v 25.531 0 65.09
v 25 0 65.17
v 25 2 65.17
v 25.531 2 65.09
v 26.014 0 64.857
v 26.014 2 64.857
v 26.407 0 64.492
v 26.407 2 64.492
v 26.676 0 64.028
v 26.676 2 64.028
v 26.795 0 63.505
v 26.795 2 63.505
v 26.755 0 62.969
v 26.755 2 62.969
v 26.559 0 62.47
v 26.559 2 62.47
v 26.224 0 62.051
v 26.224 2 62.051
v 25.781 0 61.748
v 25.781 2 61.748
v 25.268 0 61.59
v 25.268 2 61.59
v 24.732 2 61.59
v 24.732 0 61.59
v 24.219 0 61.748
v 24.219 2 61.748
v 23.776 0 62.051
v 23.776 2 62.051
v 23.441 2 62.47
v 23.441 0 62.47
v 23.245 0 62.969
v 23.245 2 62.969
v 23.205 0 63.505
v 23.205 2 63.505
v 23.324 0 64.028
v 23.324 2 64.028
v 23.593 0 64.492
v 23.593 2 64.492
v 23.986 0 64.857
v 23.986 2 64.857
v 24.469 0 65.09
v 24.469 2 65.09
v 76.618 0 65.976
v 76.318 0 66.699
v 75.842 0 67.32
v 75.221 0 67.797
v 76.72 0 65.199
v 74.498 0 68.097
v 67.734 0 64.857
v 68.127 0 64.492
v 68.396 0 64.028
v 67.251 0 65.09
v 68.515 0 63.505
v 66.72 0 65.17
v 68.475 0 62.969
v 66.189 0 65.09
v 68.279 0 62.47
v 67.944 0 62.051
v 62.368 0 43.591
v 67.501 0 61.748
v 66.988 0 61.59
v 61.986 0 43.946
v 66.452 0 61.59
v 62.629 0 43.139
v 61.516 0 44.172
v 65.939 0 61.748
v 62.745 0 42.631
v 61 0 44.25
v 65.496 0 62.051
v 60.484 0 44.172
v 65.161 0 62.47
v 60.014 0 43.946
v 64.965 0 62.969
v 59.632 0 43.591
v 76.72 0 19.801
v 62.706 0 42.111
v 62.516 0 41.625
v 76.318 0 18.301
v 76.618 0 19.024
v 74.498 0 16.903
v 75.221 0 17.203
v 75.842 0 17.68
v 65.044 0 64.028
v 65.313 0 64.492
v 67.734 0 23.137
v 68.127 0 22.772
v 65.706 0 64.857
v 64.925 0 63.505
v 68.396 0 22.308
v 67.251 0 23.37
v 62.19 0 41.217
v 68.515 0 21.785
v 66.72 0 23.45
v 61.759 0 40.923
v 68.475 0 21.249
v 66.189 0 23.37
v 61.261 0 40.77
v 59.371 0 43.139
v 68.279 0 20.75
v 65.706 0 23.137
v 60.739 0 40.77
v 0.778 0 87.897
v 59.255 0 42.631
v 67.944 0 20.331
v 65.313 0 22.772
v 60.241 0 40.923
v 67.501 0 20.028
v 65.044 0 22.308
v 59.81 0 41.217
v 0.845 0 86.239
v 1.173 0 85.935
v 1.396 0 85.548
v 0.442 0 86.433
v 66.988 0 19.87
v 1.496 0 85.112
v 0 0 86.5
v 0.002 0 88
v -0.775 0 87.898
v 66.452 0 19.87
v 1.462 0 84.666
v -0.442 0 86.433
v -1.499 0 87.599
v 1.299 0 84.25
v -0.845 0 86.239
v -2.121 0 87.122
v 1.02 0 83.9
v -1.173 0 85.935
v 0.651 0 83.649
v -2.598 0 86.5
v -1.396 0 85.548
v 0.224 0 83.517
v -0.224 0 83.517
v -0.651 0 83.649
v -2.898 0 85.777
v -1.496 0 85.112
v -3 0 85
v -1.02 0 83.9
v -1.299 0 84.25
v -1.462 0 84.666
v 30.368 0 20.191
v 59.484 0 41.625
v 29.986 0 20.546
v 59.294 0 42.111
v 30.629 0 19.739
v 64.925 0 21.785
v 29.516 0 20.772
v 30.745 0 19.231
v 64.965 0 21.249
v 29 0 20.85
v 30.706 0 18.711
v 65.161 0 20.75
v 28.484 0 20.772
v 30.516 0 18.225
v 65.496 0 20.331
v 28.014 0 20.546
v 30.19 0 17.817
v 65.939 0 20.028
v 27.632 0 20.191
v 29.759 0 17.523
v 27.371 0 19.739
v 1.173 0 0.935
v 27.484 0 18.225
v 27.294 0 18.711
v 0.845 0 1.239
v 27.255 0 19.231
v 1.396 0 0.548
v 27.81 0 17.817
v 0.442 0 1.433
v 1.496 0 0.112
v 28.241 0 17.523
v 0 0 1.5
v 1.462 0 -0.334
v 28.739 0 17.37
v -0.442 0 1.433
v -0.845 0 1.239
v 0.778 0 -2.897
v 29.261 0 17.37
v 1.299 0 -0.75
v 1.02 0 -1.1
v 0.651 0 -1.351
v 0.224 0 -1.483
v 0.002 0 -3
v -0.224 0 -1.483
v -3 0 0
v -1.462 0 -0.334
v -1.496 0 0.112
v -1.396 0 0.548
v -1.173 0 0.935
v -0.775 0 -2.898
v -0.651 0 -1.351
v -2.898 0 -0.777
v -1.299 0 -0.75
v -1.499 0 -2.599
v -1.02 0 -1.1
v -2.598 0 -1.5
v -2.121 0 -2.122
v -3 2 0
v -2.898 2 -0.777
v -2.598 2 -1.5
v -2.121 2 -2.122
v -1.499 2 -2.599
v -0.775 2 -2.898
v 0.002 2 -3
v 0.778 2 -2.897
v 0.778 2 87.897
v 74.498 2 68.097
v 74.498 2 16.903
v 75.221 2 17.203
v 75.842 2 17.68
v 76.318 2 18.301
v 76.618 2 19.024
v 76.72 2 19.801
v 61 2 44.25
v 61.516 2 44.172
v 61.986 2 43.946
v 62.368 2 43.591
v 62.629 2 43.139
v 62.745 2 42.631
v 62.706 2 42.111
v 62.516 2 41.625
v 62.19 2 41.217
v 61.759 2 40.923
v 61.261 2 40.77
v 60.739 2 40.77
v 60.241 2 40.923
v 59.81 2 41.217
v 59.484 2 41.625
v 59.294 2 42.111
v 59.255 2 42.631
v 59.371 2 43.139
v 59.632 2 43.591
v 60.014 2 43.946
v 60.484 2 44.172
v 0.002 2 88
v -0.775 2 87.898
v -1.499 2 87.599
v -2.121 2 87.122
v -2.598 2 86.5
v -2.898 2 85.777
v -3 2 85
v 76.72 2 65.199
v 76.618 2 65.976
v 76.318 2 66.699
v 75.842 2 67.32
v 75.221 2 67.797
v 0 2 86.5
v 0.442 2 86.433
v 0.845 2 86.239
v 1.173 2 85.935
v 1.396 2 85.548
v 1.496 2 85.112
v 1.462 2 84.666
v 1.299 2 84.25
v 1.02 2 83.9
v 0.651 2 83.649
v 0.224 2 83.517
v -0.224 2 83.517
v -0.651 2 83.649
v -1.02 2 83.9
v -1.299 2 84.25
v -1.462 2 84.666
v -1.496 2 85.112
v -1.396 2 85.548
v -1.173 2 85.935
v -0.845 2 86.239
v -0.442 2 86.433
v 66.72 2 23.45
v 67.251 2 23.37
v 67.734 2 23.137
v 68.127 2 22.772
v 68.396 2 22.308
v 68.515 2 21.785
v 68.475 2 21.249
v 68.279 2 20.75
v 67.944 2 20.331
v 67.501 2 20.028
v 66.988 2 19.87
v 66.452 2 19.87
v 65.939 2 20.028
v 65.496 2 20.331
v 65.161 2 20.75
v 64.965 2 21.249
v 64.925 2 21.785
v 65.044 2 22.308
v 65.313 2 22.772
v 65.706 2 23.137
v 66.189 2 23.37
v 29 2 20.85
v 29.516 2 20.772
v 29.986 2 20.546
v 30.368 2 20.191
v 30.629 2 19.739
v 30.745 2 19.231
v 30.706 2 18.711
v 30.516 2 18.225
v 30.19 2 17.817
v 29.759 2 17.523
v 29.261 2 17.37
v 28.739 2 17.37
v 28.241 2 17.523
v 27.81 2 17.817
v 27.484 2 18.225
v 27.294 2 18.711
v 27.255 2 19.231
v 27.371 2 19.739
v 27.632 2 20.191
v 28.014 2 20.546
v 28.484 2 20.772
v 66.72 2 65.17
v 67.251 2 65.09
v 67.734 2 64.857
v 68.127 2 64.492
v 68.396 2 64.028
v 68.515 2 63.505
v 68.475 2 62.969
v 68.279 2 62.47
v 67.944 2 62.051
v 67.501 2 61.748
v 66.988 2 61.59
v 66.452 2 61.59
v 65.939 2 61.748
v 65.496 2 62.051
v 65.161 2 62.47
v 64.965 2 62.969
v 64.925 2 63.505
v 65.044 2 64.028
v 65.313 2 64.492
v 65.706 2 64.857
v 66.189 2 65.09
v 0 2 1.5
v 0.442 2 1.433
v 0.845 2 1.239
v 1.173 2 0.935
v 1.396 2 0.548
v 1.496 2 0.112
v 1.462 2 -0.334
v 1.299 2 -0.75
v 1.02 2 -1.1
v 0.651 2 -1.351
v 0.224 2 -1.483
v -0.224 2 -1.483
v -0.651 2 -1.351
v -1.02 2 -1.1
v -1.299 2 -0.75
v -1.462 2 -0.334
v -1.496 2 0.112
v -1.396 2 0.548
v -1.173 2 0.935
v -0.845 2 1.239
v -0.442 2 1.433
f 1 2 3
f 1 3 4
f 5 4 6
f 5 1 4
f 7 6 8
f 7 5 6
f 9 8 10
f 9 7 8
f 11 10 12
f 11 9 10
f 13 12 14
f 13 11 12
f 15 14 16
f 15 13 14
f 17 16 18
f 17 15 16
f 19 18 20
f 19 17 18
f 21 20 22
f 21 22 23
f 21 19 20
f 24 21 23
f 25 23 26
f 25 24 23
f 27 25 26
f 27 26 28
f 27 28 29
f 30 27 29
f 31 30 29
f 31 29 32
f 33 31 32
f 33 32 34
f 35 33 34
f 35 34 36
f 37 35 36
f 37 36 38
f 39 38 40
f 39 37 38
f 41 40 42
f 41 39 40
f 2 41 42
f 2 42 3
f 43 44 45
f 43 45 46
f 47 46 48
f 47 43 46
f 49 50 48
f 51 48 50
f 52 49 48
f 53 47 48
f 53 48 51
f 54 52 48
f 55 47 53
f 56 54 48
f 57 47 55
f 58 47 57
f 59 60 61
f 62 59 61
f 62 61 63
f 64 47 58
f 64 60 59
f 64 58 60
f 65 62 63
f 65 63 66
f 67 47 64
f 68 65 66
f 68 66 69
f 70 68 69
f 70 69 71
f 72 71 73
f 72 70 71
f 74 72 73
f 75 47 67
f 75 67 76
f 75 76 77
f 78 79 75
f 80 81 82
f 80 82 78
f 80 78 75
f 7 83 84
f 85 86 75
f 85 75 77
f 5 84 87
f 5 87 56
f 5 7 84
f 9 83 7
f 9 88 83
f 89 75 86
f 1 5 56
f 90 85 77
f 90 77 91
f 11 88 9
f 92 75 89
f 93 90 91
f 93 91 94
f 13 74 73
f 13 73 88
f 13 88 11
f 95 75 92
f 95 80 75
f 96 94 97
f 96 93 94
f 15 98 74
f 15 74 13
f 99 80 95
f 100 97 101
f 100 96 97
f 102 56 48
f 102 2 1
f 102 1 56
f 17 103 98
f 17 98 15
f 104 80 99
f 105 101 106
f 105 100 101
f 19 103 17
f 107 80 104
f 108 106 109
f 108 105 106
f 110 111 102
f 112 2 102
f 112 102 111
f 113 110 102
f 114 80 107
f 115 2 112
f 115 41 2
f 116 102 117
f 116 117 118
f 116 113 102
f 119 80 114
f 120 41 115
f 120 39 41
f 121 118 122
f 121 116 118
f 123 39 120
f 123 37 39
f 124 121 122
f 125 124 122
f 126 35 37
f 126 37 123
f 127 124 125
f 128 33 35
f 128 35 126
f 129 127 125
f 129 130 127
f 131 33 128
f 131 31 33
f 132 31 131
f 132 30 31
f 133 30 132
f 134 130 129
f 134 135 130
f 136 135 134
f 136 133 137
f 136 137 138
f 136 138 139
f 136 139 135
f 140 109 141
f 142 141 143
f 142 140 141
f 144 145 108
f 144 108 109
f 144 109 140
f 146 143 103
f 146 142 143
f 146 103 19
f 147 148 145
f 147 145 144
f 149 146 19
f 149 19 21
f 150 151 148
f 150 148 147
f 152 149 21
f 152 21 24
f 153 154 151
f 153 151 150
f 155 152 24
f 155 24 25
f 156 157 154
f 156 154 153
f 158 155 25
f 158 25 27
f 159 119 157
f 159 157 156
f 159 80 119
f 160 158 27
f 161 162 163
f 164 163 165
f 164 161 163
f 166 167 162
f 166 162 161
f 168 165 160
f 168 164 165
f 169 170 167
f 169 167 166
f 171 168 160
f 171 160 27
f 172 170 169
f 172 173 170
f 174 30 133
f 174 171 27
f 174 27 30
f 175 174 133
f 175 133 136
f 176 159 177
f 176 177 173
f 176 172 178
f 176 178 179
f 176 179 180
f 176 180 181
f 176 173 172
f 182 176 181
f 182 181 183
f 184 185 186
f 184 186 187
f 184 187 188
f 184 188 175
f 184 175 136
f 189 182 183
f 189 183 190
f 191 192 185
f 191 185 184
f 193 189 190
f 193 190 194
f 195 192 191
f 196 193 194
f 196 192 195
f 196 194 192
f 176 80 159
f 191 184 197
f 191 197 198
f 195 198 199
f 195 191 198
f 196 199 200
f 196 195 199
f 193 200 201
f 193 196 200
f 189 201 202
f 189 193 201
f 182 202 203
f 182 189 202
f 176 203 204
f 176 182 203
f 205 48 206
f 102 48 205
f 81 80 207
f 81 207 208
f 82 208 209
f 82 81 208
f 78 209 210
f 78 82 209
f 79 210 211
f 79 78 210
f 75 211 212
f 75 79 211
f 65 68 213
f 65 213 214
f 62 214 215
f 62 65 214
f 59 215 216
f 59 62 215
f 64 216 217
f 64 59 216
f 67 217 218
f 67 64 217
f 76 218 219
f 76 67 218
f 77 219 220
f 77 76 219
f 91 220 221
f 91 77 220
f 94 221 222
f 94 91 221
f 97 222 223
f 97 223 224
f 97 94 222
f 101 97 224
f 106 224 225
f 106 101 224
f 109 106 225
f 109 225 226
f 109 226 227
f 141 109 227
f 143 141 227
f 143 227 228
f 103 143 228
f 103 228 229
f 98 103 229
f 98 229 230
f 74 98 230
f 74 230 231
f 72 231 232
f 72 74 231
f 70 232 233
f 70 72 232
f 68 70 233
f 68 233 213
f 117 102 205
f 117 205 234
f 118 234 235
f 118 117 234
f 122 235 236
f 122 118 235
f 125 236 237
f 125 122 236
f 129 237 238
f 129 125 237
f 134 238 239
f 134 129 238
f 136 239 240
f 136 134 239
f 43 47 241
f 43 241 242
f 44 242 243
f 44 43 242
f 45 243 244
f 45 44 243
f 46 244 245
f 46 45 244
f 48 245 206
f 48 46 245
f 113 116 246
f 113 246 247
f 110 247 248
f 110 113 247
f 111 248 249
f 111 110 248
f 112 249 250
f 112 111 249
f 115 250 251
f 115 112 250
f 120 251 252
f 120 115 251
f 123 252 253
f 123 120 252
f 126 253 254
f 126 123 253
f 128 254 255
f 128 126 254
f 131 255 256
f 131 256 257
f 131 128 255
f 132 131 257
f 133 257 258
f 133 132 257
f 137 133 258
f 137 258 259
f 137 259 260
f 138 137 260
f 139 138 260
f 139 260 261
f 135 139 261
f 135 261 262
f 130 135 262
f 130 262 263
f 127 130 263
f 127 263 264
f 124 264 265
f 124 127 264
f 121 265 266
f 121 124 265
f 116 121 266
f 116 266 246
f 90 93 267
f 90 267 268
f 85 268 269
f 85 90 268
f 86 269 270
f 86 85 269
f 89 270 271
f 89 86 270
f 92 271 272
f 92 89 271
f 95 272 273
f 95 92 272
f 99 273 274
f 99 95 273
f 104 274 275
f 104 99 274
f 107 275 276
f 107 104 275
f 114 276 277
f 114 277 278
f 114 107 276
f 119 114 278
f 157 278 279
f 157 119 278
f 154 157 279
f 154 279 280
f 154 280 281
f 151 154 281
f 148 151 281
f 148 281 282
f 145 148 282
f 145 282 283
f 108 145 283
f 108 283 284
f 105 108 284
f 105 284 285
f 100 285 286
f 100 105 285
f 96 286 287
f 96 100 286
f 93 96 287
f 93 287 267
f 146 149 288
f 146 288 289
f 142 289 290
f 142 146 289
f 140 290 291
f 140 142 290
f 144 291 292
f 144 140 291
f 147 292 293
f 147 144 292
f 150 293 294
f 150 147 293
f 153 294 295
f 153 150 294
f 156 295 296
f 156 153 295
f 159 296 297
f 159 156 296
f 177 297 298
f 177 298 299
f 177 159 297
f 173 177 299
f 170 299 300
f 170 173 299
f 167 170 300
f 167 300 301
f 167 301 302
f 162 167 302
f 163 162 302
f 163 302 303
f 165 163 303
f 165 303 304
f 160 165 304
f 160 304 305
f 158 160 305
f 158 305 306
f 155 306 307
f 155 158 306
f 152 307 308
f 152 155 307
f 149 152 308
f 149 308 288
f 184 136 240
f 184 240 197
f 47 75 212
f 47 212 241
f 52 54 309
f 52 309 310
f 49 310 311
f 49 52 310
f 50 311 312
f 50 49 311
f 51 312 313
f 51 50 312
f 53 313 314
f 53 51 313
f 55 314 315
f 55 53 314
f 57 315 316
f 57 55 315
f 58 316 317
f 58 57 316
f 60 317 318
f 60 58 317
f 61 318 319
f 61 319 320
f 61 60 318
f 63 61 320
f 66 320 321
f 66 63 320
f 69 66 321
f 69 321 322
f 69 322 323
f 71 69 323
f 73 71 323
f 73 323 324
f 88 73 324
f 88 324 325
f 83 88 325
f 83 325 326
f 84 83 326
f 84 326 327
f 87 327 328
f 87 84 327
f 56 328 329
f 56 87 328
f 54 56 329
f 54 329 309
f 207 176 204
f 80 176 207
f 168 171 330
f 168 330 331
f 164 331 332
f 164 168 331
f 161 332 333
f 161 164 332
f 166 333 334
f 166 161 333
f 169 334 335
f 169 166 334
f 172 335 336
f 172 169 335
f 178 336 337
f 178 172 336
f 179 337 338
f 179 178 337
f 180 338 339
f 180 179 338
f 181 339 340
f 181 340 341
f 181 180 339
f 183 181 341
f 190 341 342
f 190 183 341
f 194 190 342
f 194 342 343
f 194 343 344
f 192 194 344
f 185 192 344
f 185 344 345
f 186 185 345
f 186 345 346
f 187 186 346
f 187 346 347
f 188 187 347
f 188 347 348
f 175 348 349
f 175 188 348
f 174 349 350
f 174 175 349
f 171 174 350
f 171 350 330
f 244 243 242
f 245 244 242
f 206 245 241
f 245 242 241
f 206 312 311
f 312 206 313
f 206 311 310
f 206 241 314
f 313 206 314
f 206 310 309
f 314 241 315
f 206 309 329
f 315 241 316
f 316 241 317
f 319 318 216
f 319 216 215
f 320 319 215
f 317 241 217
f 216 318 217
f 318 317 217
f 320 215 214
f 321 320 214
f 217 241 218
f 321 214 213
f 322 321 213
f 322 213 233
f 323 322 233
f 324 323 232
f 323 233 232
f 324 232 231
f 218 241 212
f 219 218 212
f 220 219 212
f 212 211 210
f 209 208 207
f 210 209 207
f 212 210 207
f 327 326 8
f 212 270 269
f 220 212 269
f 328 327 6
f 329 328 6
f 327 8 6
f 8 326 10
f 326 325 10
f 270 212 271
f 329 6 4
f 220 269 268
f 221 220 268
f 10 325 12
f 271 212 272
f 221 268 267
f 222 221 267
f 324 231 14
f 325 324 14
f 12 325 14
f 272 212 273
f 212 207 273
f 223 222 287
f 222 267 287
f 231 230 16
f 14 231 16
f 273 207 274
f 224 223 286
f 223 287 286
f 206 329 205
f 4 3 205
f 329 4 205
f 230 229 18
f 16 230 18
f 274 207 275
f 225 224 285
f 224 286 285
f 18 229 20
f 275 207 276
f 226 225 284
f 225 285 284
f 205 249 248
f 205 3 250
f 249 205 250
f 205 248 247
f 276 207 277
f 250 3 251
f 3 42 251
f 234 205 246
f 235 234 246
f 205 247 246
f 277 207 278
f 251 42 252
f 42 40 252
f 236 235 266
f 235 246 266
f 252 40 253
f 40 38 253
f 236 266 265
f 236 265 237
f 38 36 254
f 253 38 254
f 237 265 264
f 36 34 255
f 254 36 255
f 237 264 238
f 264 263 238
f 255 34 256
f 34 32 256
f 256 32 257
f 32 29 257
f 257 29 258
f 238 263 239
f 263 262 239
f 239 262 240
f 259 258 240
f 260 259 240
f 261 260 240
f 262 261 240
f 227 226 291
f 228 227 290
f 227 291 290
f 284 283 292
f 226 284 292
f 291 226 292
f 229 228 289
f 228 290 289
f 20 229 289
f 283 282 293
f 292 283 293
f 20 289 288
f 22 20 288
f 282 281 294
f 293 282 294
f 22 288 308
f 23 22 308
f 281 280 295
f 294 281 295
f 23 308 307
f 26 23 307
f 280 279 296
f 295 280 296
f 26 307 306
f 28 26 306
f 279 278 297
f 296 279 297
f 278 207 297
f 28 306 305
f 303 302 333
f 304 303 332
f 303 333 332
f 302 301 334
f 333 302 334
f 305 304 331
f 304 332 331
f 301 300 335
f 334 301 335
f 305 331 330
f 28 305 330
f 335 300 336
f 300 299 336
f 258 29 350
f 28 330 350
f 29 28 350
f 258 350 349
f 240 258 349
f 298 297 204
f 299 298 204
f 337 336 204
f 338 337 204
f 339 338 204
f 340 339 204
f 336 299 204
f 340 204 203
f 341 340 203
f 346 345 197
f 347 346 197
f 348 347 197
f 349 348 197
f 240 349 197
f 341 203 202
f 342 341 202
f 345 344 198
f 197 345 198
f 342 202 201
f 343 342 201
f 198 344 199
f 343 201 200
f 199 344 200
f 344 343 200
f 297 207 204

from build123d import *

# Parameters (mm, degrees)
CROQUIS1_R              = 1.8
CROQUIS1_R_2            = 1.5
CROQUIS1_R_3            = 1.75
SALIENTE_EXTRUIR1_DEPTH = 2


with BuildPart() as part:
    # Croquis1 → Saliente-Extruir1 (new body)
    with BuildSketch(Plane(origin=(0, 0, 0), x_dir=(1, 0, 0), z_dir=(0, 1, 0))):
        with BuildLine():
            Line((0.778192871, 2.897311833), (74.498192871, -16.903241843))
            ThreePointArc((74.498192871, -16.903241843), (76.10060692, -17.974982342), (76.72, -19.800553676))
            Line((76.72, -19.800553676), (76.72, -65.199446324))
            ThreePointArc((76.72, -65.199446324), (76.10060692, -67.025017658), (74.498192871, -68.096758157))
            Line((74.498192871, -68.096758157), (0.778192871, -87.897311833))
            ThreePointArc((0.778192871, -87.897311833), (-1.825571333, -87.38060692), (-3, -85))
            Line((-3, -85), (-3, 0))
            ThreePointArc((-3, 0), (-1.825571333, 2.38060692), (0.778192871, 2.897311833))
        make_face()
        with Locations(Location((25, -63.37, 0), (0, 0, 270))):
            Circle(CROQUIS1_R, mode=Mode.SUBTRACT)
        with Locations(Location((66.72, -21.65, 0), (0, 0, 270))):
            Circle(CROQUIS1_R, mode=Mode.SUBTRACT)
        with Locations(Location((66.72, -63.37, 0), (0, 0, 270))):
            Circle(CROQUIS1_R, mode=Mode.SUBTRACT)
        with Locations(Location((0, 0, 0), (0, 0, 270))):
            Circle(CROQUIS1_R_2, mode=Mode.SUBTRACT)
        with Locations(Location((0, -85, 0), (0, 0, 270))):
            Circle(CROQUIS1_R_2, mode=Mode.SUBTRACT)
        with Locations(Location((29, -19.1, 0), (0, 0, 270))):
            Circle(CROQUIS1_R_3, mode=Mode.SUBTRACT)
        with Locations(Location((61, -42.5, 0), (0, 0, 270))):
            Circle(CROQUIS1_R_3, mode=Mode.SUBTRACT)
    extrude(amount=SALIENTE_EXTRUIR1_DEPTH)


solid = part.part
